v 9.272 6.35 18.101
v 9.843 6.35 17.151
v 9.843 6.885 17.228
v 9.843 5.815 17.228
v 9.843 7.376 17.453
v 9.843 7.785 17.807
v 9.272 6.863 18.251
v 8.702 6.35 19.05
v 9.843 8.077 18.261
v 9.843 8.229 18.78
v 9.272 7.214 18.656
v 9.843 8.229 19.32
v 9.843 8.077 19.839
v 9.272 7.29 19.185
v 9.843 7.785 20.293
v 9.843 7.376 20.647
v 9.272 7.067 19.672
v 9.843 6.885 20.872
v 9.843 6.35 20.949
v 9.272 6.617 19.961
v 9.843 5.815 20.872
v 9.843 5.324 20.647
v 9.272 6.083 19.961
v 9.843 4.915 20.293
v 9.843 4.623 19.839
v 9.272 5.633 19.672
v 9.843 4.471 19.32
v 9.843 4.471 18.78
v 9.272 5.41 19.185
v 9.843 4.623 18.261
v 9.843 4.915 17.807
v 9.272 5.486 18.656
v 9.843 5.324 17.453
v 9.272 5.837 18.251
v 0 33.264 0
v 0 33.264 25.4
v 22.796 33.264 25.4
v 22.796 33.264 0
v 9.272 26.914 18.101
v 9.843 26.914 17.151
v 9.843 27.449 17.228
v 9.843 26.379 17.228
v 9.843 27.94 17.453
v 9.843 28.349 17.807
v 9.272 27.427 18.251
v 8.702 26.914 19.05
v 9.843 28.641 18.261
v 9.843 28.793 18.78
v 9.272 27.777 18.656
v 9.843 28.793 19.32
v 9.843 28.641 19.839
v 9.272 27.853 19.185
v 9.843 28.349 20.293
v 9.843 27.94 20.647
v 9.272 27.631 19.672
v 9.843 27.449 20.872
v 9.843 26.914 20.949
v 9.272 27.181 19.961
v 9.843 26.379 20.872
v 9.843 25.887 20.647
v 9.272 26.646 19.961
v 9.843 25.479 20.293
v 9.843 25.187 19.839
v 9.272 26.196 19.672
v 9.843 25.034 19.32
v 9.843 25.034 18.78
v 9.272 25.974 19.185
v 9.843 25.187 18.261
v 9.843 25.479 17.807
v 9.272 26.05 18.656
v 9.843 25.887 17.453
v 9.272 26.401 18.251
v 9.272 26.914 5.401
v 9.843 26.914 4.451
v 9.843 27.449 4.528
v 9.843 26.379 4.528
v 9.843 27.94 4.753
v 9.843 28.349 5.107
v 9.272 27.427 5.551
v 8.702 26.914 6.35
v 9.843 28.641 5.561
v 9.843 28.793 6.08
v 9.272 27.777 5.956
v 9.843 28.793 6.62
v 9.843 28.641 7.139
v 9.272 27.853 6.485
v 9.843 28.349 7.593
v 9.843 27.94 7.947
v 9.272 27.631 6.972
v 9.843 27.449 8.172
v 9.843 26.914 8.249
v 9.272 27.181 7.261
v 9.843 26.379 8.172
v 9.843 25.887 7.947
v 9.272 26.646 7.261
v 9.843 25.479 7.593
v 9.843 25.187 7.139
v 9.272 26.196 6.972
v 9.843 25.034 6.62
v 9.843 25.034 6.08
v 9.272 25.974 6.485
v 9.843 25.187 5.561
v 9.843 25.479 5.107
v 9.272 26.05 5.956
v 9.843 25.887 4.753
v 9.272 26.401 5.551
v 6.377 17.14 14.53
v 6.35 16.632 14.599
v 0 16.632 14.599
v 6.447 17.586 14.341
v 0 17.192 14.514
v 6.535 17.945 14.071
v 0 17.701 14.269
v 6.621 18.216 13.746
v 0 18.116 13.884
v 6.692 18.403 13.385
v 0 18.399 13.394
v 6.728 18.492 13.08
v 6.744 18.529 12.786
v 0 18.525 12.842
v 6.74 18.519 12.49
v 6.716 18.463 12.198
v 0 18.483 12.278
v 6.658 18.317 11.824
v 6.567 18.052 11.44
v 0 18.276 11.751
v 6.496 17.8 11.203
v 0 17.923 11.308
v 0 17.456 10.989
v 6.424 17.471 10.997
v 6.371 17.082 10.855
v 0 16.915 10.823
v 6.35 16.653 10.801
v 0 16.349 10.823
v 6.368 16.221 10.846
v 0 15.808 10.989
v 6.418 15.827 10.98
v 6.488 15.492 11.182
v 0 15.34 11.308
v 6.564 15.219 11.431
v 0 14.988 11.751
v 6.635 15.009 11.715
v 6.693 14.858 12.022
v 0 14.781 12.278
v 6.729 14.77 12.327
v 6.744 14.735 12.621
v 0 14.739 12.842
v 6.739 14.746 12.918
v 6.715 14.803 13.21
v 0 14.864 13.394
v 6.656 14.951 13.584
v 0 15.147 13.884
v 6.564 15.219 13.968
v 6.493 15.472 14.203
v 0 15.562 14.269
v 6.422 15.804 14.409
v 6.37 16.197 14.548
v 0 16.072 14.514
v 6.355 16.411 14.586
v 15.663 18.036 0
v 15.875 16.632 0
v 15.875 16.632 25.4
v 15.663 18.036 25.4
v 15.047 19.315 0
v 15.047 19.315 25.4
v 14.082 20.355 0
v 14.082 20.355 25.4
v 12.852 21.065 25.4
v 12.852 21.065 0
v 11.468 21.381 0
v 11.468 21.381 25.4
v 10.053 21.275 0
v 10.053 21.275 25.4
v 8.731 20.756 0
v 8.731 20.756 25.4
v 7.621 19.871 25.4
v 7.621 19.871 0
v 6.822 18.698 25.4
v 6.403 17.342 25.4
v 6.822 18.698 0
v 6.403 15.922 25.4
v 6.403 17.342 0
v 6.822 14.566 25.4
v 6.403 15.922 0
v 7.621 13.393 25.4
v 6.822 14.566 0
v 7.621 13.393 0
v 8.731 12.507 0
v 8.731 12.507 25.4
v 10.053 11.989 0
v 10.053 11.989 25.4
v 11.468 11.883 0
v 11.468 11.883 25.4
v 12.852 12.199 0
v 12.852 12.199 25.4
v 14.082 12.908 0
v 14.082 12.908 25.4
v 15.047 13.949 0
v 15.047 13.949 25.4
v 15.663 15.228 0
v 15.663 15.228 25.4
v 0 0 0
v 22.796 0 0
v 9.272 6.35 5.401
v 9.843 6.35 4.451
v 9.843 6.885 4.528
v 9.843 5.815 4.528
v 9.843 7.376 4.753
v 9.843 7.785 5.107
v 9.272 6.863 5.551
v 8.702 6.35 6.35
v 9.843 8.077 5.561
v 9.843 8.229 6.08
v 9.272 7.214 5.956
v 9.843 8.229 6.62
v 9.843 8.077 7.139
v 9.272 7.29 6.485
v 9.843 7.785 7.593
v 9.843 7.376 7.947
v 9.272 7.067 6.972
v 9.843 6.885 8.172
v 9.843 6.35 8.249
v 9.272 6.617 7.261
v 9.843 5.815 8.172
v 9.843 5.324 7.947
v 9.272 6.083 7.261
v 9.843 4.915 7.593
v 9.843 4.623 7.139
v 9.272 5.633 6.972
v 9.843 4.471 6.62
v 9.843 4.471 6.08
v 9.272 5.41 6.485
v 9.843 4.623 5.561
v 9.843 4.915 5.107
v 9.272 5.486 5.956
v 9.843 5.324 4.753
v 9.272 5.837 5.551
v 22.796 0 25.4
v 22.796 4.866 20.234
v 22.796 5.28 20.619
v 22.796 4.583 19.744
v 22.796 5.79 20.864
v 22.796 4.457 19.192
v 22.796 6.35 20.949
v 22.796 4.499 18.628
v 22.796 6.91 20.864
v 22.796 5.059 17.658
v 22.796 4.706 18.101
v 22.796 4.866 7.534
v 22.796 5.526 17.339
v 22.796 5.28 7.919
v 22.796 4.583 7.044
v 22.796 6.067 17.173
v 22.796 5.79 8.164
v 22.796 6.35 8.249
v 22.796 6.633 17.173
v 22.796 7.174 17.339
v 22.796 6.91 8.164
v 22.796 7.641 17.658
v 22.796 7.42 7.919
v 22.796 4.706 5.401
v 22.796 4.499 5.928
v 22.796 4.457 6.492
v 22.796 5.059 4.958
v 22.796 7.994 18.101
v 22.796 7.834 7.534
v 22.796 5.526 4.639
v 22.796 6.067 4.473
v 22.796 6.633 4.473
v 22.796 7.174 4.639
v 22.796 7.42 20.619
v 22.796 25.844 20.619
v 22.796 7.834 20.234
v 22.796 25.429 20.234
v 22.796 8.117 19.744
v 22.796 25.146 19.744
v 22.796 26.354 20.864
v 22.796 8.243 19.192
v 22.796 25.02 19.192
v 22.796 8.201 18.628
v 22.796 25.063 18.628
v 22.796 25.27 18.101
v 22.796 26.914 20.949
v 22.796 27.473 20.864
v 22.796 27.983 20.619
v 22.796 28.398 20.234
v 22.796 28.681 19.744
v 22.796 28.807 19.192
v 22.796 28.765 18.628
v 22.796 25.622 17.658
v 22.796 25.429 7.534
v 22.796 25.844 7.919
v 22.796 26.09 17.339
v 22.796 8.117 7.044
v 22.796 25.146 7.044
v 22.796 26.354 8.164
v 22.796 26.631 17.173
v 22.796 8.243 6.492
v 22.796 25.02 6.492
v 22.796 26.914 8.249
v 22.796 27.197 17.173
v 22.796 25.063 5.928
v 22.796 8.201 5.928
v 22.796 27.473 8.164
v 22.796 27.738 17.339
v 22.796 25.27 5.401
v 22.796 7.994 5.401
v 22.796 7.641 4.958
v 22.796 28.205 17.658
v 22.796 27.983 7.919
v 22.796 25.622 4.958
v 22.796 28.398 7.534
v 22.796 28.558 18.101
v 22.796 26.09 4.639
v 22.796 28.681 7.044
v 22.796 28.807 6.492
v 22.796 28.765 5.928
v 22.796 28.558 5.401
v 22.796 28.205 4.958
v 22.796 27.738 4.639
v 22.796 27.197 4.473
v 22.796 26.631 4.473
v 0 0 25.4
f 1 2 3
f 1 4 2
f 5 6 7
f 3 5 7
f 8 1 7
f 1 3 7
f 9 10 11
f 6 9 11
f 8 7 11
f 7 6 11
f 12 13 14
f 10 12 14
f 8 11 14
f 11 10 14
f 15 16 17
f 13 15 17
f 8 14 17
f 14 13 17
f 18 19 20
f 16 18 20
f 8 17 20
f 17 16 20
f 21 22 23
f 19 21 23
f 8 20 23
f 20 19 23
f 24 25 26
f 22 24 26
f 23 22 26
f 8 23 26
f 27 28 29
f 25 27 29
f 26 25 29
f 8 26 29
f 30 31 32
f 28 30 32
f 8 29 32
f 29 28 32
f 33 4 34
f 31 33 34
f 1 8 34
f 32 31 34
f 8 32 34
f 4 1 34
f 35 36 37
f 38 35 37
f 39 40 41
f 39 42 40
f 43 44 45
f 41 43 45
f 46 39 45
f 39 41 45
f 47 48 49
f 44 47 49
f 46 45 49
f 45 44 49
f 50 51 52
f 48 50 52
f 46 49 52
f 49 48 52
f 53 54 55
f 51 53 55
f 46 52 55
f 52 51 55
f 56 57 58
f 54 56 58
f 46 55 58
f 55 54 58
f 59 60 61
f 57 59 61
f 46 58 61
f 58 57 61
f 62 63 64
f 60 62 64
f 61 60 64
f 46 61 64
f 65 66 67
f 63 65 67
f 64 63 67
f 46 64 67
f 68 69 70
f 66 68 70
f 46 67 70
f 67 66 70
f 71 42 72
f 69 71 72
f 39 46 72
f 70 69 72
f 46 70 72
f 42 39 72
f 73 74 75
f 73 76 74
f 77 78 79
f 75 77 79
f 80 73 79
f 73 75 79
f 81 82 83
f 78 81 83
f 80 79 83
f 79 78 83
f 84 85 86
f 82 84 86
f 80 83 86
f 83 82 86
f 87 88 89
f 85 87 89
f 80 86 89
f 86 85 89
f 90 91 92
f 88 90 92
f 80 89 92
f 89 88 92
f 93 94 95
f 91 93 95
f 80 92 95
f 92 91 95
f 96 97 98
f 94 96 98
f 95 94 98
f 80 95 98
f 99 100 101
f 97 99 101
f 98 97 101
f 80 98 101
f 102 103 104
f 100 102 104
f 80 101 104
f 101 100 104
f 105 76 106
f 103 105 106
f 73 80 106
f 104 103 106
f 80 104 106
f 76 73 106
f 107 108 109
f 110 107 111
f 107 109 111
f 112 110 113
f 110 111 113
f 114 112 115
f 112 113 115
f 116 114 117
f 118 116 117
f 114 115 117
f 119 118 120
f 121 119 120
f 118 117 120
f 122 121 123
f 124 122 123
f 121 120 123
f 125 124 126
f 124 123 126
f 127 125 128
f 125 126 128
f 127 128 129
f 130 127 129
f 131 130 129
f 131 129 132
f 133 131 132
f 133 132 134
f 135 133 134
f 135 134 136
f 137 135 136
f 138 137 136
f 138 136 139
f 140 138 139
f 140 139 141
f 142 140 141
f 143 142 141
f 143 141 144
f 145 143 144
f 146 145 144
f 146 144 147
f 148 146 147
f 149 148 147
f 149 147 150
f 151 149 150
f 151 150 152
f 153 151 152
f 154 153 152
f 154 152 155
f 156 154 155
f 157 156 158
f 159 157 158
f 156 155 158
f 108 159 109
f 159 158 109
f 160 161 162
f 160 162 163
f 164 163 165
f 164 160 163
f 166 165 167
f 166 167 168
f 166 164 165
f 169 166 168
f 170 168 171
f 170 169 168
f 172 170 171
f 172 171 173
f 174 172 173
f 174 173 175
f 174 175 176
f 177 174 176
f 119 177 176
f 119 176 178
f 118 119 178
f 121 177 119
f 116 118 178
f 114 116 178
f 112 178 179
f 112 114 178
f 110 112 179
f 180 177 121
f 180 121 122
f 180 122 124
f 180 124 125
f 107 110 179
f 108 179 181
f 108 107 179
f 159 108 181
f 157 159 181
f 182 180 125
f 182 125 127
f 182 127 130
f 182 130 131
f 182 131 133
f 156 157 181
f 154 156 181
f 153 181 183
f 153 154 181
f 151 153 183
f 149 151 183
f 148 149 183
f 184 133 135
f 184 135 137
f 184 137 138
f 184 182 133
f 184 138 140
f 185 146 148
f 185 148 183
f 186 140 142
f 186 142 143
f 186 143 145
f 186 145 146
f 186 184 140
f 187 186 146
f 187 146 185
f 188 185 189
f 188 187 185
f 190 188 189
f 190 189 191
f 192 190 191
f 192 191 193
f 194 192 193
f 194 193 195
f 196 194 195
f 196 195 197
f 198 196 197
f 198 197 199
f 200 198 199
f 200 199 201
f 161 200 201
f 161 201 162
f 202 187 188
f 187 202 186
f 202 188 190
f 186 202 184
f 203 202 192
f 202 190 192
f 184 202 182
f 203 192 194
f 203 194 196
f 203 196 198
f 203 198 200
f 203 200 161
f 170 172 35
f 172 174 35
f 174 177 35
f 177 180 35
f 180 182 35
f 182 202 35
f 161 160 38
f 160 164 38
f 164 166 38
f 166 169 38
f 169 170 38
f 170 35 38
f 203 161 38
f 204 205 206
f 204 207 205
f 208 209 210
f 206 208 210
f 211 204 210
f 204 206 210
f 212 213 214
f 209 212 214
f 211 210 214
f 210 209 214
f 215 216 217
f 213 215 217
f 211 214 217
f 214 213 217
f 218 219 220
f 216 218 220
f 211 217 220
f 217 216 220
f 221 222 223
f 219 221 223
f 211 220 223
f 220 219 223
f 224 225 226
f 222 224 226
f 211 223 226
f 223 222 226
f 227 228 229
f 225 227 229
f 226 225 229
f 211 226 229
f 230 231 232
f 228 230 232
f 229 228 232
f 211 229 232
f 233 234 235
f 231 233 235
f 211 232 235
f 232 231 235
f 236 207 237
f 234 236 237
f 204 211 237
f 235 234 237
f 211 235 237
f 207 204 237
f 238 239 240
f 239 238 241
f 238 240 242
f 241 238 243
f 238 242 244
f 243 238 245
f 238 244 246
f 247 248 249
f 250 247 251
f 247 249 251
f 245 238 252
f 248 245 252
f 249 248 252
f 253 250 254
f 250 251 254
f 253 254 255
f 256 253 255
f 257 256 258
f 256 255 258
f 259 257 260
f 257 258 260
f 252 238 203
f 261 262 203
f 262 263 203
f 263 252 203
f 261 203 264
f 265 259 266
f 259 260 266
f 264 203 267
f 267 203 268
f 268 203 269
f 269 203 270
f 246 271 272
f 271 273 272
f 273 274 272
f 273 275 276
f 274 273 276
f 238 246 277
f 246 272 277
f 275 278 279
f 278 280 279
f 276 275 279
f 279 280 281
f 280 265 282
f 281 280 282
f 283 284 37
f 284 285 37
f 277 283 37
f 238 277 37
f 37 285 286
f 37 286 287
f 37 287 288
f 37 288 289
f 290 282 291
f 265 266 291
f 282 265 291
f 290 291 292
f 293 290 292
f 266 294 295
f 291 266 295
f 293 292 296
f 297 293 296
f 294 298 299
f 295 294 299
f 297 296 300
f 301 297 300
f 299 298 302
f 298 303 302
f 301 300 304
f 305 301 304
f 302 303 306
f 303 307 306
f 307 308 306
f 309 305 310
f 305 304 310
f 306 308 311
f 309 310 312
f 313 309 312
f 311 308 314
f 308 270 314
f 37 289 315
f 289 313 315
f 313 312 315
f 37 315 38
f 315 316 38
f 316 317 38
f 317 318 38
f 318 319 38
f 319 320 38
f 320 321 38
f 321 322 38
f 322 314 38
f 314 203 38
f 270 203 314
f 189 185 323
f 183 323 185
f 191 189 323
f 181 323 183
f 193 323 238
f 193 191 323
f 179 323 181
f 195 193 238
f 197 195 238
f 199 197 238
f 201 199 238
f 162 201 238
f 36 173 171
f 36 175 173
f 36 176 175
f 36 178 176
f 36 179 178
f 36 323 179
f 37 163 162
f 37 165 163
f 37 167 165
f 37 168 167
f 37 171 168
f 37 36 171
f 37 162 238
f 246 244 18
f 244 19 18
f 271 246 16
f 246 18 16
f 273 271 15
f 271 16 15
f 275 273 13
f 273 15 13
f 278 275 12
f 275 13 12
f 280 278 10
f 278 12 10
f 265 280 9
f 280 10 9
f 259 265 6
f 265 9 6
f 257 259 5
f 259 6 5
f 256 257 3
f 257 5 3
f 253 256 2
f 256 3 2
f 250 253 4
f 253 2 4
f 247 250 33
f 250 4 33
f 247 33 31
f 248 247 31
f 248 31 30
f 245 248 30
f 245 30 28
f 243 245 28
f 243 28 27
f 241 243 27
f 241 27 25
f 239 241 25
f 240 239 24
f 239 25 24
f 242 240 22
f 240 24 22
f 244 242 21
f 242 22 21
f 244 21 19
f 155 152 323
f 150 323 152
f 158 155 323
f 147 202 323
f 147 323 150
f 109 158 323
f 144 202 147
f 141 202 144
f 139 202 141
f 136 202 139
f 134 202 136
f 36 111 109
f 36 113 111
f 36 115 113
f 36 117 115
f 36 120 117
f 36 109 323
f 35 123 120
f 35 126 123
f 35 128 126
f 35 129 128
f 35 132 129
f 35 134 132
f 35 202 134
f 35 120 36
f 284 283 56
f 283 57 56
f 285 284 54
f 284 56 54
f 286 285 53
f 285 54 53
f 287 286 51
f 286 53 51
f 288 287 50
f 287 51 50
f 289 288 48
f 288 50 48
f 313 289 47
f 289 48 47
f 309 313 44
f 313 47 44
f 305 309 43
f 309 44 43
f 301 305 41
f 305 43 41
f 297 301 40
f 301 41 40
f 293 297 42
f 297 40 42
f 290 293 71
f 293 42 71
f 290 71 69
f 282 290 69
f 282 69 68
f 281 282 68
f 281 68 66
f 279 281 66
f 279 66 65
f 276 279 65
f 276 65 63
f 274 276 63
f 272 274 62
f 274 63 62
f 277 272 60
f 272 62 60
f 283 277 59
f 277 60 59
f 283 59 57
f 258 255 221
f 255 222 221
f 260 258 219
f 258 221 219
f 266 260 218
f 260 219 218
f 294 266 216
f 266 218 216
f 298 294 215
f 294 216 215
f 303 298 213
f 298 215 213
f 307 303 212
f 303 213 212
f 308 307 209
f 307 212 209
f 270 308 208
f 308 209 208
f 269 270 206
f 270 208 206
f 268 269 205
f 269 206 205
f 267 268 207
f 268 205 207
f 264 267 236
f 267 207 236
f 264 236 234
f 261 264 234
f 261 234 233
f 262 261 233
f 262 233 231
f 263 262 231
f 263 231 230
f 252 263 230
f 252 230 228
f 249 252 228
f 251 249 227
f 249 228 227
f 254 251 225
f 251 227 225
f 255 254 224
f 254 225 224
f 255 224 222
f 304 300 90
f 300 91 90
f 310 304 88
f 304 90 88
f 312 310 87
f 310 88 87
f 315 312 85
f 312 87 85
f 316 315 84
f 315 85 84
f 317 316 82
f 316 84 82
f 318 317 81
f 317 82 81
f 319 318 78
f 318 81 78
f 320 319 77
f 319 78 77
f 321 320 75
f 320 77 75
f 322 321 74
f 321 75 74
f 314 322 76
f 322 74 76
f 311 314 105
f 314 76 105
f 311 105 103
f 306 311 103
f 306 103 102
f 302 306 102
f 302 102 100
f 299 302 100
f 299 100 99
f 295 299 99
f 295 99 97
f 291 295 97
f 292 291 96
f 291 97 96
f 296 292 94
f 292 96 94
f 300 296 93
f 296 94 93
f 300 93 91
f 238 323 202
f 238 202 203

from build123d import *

# Parameters (mm, degrees)
SKETCH1_W                            = 22.7965
SKETCH1_H                            = 33.263796714
SKETCH1_R                            = 4.7625
BOSS_EXTRUDE1_DEPTH                  = 25.4
SET_SCREW_10_24_TAPPED_HOLE1_REACH   = 49.658
SET_SCREW_10_24_TAPPED_HOLE1_BORE_R  = 1.89865
MOUNT_SCREW_10_24_TAPPED_HOLE2_D     = 3.7973
MOUNT_SCREW_10_24_TAPPED_HOLE2_DEPTH = 12.954
MOUNT_SCREW_10_24_TAPPED_HOLE2_TIP   = 1.140824014


with BuildPart() as part:
    # Sketch1 → Boss-Extrude1 (new body)
    with BuildSketch(Plane.XY):
        with Locations((11.39825, 16.631898357)):
            Rectangle(SKETCH1_W, SKETCH1_H)
        with Locations((11.1125, 16.631898357)):
            Circle(SKETCH1_R, mode=Mode.SUBTRACT)
    extrude(amount=BOSS_EXTRUDE1_DEPTH)

    # set screw #10-24 Tapped Hole1 bore → set screw #10-24 Tapped Hole1 (cut, up to next)
    with BuildSketch(Plane.ZY, mode=Mode.PRIVATE) as set_screw_10_24_tapped_hole1_sk1:
        with Locations((12.7, 16.631898357)):
            Circle(SET_SCREW_10_24_TAPPED_HOLE1_BORE_R)
    set_screw_10_24_tapped_hole1_tool1 = extrude(set_screw_10_24_tapped_hole1_sk1.sketch, amount=-SET_SCREW_10_24_TAPPED_HOLE1_REACH, mode=Mode.PRIVATE) & part.part
    add(set_screw_10_24_tapped_hole1_tool1.solids().sort_by_distance((0, 16.631898, 12.7))[0], mode=Mode.SUBTRACT)

    # mount screw #10-24 Tapped Hole2
    with Locations(Plane(origin=(22.7965, 0, 0), x_dir=(0, 0, -1), z_dir=(1, 0, 0))):
        with Locations((-19.05, 26.913796714), (-6.35, 26.913796714), (-19.05, 6.35), (-6.35, 6.35)):
            Hole(MOUNT_SCREW_10_24_TAPPED_HOLE2_D / 2, depth=MOUNT_SCREW_10_24_TAPPED_HOLE2_DEPTH)
            with Locations((0, 0, -(MOUNT_SCREW_10_24_TAPPED_HOLE2_DEPTH + MOUNT_SCREW_10_24_TAPPED_HOLE2_TIP / 2))):  # 118° drill point
                Cone(0, MOUNT_SCREW_10_24_TAPPED_HOLE2_D / 2, MOUNT_SCREW_10_24_TAPPED_HOLE2_TIP, mode=Mode.SUBTRACT)


solid = part.part
